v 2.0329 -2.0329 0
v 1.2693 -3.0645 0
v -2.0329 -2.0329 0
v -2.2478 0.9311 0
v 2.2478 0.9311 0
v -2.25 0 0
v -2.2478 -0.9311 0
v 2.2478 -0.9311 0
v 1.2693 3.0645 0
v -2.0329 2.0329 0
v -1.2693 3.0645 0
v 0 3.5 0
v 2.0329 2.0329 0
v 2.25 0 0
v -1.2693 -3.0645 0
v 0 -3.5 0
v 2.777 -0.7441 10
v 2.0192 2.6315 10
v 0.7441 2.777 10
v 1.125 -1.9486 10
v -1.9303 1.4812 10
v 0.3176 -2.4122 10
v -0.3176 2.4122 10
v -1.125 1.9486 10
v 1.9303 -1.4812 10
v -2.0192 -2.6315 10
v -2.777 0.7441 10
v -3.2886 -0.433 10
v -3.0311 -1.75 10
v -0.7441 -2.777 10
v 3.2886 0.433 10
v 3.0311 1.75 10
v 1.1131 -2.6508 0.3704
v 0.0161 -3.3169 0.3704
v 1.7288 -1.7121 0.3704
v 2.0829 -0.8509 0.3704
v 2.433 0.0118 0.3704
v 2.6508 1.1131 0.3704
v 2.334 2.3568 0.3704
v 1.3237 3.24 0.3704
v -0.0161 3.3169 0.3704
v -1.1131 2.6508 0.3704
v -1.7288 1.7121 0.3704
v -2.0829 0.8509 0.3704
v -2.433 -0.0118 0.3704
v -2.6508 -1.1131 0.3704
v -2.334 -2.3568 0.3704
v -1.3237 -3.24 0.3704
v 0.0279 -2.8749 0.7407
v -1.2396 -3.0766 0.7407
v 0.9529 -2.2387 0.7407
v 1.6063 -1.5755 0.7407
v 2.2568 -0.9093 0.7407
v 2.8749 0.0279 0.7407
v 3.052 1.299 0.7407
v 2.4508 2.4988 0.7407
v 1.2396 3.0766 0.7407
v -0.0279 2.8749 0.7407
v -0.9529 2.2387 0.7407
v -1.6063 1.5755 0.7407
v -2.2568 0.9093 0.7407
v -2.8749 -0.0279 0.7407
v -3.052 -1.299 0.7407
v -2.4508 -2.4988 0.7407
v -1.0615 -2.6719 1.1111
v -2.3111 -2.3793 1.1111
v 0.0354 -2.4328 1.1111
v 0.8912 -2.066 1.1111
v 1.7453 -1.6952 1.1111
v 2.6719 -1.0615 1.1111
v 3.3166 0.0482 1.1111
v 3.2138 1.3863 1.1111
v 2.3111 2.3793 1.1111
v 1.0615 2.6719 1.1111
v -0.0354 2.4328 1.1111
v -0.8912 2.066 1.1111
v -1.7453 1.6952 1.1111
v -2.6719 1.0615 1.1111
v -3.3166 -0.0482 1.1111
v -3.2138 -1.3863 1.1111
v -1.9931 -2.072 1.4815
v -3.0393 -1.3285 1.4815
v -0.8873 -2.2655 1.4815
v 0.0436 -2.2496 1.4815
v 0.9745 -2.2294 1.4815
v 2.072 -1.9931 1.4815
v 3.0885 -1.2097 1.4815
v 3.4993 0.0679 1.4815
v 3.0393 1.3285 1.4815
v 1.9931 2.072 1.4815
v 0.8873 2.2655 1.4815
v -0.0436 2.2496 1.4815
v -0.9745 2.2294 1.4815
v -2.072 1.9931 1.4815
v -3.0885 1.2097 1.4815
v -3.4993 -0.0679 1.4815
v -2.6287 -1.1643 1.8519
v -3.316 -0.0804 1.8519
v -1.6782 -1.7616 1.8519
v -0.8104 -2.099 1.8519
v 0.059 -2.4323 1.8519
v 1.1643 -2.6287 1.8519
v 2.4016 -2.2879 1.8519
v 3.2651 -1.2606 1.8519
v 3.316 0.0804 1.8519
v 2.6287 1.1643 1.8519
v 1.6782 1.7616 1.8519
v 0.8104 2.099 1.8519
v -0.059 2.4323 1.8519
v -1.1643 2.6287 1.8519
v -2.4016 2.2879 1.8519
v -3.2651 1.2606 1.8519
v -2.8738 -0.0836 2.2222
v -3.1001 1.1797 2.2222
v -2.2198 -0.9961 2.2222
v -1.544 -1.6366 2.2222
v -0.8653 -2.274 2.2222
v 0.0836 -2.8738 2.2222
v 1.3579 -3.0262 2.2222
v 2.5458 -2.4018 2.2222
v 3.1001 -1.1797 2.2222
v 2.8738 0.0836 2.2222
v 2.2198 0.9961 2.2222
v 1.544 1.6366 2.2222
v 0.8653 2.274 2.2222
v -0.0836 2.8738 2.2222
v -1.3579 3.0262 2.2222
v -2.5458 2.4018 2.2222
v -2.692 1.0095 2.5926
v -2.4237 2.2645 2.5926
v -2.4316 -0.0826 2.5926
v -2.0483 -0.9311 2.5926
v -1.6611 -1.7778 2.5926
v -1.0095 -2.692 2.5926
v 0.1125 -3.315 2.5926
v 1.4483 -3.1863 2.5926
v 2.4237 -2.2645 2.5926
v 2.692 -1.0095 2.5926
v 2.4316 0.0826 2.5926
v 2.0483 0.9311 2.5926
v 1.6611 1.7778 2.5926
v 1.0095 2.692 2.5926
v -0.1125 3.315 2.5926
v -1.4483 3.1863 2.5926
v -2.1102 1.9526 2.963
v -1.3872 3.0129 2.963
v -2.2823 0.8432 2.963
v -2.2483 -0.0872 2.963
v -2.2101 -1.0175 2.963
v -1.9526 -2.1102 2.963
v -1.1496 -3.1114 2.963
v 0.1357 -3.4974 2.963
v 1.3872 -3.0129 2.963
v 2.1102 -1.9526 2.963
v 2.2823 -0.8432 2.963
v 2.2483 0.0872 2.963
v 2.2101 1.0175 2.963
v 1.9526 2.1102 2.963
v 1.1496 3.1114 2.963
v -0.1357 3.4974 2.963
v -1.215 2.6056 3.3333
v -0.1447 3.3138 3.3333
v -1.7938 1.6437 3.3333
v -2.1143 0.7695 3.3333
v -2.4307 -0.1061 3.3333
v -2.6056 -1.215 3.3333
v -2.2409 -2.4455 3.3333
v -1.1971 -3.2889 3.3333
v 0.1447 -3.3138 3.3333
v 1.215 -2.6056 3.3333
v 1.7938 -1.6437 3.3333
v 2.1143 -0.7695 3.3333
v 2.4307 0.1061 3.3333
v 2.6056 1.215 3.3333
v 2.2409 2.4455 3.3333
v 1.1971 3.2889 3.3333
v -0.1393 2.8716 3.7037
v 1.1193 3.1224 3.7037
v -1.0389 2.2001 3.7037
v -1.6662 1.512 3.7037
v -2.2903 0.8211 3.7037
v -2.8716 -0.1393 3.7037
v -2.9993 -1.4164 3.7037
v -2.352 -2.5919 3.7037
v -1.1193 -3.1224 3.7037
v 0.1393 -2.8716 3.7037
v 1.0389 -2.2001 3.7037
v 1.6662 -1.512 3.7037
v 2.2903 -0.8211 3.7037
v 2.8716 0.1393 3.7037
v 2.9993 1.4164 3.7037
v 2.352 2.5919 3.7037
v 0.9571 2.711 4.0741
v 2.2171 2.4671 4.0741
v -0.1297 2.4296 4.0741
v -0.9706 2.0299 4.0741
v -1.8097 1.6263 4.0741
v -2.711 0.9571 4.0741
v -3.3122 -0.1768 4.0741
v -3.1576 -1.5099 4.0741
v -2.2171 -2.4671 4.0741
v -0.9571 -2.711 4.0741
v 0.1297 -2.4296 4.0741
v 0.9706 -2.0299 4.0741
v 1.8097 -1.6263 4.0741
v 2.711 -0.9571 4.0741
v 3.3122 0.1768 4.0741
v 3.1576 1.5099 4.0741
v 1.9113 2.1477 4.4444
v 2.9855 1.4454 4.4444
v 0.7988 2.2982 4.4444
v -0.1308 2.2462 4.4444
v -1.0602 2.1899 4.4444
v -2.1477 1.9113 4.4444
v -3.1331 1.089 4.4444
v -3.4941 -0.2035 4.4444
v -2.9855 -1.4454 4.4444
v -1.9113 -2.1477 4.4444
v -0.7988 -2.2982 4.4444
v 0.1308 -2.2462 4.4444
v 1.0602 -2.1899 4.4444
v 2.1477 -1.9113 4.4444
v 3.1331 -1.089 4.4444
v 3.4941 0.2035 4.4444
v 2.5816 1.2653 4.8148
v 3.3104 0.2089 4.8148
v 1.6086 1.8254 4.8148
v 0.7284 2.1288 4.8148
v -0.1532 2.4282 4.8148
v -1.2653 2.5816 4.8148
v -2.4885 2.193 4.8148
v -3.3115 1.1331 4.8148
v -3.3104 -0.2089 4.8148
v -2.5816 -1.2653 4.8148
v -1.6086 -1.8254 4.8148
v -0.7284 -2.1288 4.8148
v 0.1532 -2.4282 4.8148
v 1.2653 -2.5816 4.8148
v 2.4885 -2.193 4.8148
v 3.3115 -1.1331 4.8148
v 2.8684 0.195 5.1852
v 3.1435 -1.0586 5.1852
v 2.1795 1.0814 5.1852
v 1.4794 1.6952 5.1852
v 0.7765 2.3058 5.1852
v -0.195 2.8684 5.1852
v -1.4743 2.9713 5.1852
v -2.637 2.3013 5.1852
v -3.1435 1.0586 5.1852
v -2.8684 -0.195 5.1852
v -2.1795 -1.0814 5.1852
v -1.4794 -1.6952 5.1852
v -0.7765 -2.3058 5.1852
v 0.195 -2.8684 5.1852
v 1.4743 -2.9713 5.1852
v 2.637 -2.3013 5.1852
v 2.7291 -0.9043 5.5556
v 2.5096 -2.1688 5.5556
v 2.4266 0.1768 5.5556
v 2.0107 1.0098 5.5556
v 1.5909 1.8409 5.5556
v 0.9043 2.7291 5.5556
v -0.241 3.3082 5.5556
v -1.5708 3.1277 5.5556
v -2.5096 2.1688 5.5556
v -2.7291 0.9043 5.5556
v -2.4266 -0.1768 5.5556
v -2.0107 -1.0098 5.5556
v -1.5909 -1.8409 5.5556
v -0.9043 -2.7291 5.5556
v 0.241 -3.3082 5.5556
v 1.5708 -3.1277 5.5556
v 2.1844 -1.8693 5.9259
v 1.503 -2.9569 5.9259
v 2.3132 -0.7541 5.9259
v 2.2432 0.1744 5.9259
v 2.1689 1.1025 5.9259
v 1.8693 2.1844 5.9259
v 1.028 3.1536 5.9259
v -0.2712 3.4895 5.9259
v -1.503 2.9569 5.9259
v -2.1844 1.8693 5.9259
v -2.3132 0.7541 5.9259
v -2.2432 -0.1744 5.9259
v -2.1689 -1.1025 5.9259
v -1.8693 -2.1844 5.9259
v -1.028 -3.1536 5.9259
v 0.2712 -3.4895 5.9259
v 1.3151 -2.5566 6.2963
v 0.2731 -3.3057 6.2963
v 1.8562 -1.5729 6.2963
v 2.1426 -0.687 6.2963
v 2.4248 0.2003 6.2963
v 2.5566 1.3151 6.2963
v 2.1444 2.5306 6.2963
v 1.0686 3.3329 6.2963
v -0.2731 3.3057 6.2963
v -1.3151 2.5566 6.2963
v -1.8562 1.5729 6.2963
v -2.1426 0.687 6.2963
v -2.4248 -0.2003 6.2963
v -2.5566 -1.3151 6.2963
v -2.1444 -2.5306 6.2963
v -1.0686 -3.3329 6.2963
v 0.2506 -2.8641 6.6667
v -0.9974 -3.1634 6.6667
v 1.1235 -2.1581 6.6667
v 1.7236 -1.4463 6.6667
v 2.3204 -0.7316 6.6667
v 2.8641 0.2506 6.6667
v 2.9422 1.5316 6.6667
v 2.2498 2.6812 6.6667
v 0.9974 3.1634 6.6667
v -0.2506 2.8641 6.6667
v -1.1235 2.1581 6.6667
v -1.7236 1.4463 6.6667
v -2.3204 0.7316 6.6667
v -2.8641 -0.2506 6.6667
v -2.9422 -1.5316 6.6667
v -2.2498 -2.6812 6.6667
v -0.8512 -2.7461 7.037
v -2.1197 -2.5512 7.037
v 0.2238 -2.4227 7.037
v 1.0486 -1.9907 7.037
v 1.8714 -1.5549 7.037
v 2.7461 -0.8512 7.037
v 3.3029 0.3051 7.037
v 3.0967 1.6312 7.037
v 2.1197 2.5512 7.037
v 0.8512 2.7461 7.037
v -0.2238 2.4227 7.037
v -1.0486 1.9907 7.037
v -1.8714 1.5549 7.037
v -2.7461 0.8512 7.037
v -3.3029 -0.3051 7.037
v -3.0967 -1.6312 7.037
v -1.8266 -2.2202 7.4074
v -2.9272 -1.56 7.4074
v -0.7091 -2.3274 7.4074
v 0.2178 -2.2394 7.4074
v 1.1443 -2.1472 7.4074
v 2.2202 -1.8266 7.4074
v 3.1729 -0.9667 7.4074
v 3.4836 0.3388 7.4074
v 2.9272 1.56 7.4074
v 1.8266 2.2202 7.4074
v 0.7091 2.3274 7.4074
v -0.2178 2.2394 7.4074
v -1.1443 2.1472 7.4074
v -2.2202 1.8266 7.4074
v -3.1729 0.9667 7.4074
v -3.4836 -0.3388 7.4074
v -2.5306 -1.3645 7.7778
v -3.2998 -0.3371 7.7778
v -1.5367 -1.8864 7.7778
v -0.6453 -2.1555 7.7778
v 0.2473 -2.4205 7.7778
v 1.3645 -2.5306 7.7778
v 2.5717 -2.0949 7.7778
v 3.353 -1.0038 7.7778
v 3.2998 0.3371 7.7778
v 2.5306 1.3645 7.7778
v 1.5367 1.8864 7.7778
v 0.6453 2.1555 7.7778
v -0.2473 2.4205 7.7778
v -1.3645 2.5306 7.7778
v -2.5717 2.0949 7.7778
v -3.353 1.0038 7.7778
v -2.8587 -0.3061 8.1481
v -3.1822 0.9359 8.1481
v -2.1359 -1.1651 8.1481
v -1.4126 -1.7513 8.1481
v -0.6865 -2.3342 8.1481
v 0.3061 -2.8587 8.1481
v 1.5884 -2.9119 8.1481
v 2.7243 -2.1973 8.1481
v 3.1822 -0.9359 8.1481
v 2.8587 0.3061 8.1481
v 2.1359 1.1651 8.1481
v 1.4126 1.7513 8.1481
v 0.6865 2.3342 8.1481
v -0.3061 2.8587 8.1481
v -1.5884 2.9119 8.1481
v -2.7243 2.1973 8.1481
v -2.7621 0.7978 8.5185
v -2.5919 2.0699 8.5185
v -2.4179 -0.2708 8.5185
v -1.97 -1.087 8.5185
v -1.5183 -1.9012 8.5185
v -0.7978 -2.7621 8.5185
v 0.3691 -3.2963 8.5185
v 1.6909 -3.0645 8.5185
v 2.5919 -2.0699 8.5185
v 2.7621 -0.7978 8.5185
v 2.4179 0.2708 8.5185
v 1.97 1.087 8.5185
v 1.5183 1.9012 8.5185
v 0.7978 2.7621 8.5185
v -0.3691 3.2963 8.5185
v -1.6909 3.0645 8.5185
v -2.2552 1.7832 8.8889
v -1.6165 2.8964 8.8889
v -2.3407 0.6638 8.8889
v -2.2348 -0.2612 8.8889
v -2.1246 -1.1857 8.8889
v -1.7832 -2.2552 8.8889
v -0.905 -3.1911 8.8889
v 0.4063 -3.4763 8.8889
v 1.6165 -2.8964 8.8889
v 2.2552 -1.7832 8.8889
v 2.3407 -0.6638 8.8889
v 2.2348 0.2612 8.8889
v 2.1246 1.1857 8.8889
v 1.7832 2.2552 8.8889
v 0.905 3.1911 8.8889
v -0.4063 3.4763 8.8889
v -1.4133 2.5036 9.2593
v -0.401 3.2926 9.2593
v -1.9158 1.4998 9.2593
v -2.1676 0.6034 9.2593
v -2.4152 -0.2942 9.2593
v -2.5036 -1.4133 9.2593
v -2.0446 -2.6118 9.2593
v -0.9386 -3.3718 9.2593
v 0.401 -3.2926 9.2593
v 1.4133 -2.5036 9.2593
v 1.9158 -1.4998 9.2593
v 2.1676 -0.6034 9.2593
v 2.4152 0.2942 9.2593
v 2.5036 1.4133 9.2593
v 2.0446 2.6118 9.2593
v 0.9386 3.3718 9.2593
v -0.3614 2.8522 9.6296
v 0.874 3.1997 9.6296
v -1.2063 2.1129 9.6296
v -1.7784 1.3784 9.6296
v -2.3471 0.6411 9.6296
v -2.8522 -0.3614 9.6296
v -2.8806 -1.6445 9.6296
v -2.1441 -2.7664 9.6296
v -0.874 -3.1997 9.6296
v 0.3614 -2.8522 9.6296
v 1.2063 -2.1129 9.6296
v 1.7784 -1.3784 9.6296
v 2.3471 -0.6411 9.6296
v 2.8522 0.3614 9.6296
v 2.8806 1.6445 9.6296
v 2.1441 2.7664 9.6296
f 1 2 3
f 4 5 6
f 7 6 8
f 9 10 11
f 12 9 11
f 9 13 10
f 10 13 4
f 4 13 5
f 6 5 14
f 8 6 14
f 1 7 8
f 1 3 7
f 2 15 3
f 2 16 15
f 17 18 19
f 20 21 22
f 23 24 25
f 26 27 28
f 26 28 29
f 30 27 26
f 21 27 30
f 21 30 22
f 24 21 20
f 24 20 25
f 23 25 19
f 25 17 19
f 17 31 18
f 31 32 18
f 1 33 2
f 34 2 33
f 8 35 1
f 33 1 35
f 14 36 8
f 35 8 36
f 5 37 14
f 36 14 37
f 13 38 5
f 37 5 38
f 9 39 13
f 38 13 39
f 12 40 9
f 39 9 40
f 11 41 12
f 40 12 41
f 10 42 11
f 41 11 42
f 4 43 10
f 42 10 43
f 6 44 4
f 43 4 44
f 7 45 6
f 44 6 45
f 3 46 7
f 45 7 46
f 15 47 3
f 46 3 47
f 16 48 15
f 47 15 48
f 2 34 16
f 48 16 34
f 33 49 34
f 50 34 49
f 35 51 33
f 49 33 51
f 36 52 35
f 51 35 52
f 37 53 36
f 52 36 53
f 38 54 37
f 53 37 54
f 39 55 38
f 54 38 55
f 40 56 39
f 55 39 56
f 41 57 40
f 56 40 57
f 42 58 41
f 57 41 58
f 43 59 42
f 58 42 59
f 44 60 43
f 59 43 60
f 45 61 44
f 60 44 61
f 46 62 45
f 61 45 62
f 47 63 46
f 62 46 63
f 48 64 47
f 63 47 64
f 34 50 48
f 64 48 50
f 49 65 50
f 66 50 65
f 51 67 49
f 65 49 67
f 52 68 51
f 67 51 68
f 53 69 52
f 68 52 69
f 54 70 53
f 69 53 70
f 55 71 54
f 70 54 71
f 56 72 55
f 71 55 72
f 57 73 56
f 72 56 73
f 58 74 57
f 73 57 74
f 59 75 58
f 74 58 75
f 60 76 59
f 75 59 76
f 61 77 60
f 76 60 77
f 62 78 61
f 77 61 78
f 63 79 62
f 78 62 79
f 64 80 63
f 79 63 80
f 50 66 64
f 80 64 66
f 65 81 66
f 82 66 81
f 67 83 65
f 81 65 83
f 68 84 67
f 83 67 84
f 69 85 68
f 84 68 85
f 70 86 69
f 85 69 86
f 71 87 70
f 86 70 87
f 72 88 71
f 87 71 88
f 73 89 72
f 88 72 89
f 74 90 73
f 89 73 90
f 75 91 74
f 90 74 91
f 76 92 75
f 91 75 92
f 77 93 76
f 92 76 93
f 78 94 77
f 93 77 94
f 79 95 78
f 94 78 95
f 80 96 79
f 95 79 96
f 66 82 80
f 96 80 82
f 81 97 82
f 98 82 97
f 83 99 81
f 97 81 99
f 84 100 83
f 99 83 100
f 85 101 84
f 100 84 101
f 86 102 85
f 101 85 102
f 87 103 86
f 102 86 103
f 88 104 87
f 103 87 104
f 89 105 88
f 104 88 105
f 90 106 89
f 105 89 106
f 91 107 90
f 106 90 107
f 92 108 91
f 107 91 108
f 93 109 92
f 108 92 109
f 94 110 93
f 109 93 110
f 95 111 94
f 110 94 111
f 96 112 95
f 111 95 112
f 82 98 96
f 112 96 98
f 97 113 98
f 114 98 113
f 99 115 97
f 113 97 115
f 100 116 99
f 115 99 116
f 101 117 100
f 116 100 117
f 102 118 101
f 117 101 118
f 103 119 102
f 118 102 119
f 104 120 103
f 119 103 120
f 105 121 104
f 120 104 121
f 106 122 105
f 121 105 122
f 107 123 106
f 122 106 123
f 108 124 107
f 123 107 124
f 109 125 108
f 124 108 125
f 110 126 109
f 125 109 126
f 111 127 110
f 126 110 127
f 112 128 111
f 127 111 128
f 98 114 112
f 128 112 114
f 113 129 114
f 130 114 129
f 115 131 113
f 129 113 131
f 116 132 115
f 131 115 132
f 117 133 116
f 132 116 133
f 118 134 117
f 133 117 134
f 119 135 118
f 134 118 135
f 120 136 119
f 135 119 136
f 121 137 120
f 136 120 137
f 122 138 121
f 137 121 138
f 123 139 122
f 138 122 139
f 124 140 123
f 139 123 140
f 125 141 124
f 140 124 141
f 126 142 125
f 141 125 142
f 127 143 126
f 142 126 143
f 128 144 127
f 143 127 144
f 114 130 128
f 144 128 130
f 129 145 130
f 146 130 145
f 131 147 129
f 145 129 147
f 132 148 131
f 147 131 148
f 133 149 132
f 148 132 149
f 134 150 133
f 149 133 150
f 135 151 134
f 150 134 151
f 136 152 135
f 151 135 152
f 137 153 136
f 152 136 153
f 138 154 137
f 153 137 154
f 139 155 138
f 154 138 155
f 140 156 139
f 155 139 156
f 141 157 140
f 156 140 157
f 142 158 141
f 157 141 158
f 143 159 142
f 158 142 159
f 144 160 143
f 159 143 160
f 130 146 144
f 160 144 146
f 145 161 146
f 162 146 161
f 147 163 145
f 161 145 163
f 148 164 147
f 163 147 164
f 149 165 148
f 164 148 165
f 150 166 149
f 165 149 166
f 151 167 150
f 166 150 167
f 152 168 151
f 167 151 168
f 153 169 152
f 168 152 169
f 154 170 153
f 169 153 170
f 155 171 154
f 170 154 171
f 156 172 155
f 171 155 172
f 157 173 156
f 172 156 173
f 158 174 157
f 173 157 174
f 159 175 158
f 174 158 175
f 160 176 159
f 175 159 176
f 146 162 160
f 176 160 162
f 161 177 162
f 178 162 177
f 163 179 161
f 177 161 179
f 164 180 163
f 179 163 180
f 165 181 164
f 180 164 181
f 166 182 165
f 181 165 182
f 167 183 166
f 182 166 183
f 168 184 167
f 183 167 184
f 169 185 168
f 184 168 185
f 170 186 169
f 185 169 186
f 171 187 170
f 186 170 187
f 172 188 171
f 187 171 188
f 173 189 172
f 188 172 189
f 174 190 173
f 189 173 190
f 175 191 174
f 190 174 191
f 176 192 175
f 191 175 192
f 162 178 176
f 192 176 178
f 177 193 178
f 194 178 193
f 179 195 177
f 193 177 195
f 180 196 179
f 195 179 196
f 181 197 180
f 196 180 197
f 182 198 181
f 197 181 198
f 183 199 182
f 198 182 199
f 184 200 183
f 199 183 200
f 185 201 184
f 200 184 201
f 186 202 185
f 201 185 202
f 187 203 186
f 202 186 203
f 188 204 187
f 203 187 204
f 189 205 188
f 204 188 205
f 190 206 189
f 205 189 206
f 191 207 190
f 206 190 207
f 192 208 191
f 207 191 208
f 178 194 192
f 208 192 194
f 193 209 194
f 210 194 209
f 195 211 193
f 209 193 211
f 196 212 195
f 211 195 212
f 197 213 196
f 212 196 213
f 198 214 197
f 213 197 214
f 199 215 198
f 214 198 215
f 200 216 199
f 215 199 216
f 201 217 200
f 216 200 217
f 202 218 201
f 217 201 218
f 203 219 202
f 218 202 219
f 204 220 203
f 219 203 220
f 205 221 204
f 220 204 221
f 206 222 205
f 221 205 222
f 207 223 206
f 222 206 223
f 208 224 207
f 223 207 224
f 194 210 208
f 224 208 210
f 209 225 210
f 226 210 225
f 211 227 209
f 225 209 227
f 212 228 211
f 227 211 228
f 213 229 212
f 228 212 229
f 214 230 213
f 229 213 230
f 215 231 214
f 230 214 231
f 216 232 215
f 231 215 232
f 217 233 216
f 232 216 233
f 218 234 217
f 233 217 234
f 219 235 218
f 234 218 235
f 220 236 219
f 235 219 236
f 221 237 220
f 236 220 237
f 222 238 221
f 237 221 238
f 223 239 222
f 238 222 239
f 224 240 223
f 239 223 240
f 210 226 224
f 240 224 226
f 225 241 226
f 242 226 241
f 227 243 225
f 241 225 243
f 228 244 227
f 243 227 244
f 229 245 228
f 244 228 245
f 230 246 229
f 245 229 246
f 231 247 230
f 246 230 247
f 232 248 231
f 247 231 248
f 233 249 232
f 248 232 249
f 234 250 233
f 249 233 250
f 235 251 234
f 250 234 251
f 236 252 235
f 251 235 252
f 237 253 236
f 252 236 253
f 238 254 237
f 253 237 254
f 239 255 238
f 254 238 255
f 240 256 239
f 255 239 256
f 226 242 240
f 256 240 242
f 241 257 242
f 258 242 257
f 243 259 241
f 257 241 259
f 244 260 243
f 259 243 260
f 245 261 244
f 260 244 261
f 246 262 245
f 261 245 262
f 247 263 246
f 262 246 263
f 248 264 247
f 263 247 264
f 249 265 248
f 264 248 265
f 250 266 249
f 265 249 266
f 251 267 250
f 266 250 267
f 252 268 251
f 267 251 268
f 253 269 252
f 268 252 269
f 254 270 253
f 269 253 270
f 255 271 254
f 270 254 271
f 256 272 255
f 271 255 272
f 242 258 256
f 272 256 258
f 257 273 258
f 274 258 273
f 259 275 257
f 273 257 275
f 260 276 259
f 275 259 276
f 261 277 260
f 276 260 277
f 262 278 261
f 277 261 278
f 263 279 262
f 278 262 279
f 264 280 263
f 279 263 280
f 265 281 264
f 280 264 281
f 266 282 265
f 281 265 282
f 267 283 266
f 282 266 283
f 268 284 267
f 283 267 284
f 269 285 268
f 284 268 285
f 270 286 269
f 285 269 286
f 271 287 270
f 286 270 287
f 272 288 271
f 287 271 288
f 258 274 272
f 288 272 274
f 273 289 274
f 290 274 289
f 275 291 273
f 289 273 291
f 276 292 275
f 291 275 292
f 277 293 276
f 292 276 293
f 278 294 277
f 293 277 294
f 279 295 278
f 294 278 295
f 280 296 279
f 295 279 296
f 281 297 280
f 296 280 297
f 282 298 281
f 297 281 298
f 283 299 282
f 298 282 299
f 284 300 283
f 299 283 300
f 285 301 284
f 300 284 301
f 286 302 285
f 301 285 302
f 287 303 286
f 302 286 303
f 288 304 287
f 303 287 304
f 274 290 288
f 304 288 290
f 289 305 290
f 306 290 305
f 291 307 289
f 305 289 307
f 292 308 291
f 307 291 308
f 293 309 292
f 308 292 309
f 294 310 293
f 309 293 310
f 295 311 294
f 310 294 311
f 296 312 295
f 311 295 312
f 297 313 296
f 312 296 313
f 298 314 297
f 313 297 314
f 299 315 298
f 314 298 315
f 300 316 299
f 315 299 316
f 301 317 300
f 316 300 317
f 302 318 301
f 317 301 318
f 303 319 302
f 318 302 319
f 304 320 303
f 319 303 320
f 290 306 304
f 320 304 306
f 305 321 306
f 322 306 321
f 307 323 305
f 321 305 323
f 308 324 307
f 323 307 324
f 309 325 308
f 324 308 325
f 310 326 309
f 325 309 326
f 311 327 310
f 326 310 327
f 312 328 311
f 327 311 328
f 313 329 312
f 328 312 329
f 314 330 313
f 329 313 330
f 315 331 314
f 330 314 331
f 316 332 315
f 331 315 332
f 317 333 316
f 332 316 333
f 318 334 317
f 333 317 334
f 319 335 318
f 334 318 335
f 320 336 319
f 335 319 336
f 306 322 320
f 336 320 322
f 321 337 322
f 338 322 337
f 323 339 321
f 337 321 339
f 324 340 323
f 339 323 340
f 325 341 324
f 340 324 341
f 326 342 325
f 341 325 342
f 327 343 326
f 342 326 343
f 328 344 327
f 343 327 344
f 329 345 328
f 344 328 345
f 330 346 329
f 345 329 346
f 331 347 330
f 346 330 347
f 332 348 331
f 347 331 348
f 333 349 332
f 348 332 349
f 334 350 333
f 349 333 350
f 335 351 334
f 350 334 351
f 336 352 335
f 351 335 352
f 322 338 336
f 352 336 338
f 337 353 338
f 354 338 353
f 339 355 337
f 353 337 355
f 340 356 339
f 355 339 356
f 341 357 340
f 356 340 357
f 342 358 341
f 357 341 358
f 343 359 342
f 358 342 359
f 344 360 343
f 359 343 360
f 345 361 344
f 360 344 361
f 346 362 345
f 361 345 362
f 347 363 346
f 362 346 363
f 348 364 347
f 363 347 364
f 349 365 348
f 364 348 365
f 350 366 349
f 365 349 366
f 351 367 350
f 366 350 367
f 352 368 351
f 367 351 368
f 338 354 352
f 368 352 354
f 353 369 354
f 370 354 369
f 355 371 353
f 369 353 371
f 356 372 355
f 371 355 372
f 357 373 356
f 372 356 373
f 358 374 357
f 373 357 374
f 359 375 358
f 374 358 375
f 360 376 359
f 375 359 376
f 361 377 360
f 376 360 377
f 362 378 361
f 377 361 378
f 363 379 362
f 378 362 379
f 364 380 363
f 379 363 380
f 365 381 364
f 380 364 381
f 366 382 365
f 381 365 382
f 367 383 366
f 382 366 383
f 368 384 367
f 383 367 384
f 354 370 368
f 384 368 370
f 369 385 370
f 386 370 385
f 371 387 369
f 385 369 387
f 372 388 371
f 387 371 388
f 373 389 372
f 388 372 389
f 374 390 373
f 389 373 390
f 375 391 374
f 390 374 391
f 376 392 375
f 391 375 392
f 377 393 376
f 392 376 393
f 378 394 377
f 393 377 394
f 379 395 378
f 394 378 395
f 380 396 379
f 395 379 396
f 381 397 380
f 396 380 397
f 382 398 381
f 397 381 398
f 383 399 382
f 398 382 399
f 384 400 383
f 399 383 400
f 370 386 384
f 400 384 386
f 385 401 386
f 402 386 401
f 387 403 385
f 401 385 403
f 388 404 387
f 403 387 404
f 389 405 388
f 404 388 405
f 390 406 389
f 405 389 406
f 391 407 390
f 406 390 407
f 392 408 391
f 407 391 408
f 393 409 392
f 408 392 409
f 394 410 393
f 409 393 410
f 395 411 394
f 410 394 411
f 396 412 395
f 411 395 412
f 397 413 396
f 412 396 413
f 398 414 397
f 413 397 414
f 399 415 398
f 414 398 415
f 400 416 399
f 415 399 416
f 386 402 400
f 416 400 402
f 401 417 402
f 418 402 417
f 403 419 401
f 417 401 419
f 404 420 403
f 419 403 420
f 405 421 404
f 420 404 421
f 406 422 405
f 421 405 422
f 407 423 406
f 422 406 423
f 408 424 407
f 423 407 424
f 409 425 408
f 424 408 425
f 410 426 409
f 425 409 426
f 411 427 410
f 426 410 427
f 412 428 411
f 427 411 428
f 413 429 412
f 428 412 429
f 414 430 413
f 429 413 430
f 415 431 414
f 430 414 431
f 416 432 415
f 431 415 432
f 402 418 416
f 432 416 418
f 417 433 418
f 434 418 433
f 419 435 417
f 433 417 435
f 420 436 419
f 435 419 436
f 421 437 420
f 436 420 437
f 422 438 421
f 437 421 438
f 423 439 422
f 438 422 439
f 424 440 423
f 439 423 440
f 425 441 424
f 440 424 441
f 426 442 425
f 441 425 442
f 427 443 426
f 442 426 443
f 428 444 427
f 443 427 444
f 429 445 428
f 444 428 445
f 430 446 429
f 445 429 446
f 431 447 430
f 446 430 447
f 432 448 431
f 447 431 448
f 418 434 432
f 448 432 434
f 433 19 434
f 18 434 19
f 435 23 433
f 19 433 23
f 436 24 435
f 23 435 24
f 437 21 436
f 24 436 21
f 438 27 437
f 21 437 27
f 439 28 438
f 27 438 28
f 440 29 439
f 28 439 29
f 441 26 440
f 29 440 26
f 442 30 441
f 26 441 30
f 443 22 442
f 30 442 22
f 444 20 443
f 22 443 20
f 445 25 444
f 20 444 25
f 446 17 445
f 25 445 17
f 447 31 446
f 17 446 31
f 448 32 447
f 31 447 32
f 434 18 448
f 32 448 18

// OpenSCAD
/*
author: Lukas Süss aka mechadense
date: 2014  
licence: public domain 

Description:
This demo code illustrates
how the lack of any dynammic array manipulation in OpenSCAD 
effectively inhibits parametric resolution
in geometries using the polygon(...) command.
*/

// test part geometry
r0 = 3.5;
dr = 1.25; // profile depth
l  = 10;
k  = 3; // thread lead
n  = 2; // multi start
turns = l/(k*n);

roughscrew();

module roughscrew()
{
  linear_extrude(height=l,center=false,convexity=6,twist=360*turns,$fn=16)
  polygon(points=pointarray16(r0,dr,n), paths=[path16]);
}

function rr(r0,dr,n,phi) = r0 + dr*(profile1(phi*n)-1);
function profile1(x) = (1 - cos(x))/2;
function c(i) = (i/16.0)*360; // index to angle conversion

// section with necessarily hardcoded 16 vertex resolution
path16 = [0,1,2,3,4,5,6,7,8,9,10,11,12,13,14,15];
function pointarray16(r0,dr,n) = [[rr(r0,dr,n,c(0))*cos(c(0)),rr(r0,dr,n,c(0))*sin(c(0))],[rr(r0,dr,n,c(1))*cos(c(1)),rr(r0,dr,n,c(1))*sin(c(1))],[rr(r0,dr,n,c(2))*cos(c(2)),rr(r0,dr,n,c(2))*sin(c(2))],[rr(r0,dr,n,c(3))*cos(c(3)),rr(r0,dr,n,c(3))*sin(c(3))],[rr(r0,dr,n,c(4))*cos(c(4)),rr(r0,dr,n,c(4))*sin(c(4))],[rr(r0,dr,n,c(5))*cos(c(5)),rr(r0,dr,n,c(5))*sin(c(5))],[rr(r0,dr,n,c(6))*cos(c(6)),rr(r0,dr,n,c(6))*sin(c(6))],[rr(r0,dr,n,c(7))*cos(c(7)),rr(r0,dr,n,c(7))*sin(c(7))],[rr(r0,dr,n,c(8))*cos(c(8)),rr(r0,dr,n,c(8))*sin(c(8))],[rr(r0,dr,n,c(9))*cos(c(9)),rr(r0,dr,n,c(9))*sin(c(9))],[rr(r0,dr,n,c(10))*cos(c(10)),rr(r0,dr,n,c(10))*sin(c(10))],[rr(r0,dr,n,c(11))*cos(c(11)),rr(r0,dr,n,c(11))*sin(c(11))],[rr(r0,dr,n,c(12))*cos(c(12)),rr(r0,dr,n,c(12))*sin(c(12))],[rr(r0,dr,n,c(13))*cos(c(13)),rr(r0,dr,n,c(13))*sin(c(13))],[rr(r0,dr,n,c(14))*cos(c(14)),rr(r0,dr,n,c(14))*sin(c(14))],[rr(r0,dr,n,c(15))*cos(c(15)),rr(r0,dr,n,c(15))*sin(c(15))]];
